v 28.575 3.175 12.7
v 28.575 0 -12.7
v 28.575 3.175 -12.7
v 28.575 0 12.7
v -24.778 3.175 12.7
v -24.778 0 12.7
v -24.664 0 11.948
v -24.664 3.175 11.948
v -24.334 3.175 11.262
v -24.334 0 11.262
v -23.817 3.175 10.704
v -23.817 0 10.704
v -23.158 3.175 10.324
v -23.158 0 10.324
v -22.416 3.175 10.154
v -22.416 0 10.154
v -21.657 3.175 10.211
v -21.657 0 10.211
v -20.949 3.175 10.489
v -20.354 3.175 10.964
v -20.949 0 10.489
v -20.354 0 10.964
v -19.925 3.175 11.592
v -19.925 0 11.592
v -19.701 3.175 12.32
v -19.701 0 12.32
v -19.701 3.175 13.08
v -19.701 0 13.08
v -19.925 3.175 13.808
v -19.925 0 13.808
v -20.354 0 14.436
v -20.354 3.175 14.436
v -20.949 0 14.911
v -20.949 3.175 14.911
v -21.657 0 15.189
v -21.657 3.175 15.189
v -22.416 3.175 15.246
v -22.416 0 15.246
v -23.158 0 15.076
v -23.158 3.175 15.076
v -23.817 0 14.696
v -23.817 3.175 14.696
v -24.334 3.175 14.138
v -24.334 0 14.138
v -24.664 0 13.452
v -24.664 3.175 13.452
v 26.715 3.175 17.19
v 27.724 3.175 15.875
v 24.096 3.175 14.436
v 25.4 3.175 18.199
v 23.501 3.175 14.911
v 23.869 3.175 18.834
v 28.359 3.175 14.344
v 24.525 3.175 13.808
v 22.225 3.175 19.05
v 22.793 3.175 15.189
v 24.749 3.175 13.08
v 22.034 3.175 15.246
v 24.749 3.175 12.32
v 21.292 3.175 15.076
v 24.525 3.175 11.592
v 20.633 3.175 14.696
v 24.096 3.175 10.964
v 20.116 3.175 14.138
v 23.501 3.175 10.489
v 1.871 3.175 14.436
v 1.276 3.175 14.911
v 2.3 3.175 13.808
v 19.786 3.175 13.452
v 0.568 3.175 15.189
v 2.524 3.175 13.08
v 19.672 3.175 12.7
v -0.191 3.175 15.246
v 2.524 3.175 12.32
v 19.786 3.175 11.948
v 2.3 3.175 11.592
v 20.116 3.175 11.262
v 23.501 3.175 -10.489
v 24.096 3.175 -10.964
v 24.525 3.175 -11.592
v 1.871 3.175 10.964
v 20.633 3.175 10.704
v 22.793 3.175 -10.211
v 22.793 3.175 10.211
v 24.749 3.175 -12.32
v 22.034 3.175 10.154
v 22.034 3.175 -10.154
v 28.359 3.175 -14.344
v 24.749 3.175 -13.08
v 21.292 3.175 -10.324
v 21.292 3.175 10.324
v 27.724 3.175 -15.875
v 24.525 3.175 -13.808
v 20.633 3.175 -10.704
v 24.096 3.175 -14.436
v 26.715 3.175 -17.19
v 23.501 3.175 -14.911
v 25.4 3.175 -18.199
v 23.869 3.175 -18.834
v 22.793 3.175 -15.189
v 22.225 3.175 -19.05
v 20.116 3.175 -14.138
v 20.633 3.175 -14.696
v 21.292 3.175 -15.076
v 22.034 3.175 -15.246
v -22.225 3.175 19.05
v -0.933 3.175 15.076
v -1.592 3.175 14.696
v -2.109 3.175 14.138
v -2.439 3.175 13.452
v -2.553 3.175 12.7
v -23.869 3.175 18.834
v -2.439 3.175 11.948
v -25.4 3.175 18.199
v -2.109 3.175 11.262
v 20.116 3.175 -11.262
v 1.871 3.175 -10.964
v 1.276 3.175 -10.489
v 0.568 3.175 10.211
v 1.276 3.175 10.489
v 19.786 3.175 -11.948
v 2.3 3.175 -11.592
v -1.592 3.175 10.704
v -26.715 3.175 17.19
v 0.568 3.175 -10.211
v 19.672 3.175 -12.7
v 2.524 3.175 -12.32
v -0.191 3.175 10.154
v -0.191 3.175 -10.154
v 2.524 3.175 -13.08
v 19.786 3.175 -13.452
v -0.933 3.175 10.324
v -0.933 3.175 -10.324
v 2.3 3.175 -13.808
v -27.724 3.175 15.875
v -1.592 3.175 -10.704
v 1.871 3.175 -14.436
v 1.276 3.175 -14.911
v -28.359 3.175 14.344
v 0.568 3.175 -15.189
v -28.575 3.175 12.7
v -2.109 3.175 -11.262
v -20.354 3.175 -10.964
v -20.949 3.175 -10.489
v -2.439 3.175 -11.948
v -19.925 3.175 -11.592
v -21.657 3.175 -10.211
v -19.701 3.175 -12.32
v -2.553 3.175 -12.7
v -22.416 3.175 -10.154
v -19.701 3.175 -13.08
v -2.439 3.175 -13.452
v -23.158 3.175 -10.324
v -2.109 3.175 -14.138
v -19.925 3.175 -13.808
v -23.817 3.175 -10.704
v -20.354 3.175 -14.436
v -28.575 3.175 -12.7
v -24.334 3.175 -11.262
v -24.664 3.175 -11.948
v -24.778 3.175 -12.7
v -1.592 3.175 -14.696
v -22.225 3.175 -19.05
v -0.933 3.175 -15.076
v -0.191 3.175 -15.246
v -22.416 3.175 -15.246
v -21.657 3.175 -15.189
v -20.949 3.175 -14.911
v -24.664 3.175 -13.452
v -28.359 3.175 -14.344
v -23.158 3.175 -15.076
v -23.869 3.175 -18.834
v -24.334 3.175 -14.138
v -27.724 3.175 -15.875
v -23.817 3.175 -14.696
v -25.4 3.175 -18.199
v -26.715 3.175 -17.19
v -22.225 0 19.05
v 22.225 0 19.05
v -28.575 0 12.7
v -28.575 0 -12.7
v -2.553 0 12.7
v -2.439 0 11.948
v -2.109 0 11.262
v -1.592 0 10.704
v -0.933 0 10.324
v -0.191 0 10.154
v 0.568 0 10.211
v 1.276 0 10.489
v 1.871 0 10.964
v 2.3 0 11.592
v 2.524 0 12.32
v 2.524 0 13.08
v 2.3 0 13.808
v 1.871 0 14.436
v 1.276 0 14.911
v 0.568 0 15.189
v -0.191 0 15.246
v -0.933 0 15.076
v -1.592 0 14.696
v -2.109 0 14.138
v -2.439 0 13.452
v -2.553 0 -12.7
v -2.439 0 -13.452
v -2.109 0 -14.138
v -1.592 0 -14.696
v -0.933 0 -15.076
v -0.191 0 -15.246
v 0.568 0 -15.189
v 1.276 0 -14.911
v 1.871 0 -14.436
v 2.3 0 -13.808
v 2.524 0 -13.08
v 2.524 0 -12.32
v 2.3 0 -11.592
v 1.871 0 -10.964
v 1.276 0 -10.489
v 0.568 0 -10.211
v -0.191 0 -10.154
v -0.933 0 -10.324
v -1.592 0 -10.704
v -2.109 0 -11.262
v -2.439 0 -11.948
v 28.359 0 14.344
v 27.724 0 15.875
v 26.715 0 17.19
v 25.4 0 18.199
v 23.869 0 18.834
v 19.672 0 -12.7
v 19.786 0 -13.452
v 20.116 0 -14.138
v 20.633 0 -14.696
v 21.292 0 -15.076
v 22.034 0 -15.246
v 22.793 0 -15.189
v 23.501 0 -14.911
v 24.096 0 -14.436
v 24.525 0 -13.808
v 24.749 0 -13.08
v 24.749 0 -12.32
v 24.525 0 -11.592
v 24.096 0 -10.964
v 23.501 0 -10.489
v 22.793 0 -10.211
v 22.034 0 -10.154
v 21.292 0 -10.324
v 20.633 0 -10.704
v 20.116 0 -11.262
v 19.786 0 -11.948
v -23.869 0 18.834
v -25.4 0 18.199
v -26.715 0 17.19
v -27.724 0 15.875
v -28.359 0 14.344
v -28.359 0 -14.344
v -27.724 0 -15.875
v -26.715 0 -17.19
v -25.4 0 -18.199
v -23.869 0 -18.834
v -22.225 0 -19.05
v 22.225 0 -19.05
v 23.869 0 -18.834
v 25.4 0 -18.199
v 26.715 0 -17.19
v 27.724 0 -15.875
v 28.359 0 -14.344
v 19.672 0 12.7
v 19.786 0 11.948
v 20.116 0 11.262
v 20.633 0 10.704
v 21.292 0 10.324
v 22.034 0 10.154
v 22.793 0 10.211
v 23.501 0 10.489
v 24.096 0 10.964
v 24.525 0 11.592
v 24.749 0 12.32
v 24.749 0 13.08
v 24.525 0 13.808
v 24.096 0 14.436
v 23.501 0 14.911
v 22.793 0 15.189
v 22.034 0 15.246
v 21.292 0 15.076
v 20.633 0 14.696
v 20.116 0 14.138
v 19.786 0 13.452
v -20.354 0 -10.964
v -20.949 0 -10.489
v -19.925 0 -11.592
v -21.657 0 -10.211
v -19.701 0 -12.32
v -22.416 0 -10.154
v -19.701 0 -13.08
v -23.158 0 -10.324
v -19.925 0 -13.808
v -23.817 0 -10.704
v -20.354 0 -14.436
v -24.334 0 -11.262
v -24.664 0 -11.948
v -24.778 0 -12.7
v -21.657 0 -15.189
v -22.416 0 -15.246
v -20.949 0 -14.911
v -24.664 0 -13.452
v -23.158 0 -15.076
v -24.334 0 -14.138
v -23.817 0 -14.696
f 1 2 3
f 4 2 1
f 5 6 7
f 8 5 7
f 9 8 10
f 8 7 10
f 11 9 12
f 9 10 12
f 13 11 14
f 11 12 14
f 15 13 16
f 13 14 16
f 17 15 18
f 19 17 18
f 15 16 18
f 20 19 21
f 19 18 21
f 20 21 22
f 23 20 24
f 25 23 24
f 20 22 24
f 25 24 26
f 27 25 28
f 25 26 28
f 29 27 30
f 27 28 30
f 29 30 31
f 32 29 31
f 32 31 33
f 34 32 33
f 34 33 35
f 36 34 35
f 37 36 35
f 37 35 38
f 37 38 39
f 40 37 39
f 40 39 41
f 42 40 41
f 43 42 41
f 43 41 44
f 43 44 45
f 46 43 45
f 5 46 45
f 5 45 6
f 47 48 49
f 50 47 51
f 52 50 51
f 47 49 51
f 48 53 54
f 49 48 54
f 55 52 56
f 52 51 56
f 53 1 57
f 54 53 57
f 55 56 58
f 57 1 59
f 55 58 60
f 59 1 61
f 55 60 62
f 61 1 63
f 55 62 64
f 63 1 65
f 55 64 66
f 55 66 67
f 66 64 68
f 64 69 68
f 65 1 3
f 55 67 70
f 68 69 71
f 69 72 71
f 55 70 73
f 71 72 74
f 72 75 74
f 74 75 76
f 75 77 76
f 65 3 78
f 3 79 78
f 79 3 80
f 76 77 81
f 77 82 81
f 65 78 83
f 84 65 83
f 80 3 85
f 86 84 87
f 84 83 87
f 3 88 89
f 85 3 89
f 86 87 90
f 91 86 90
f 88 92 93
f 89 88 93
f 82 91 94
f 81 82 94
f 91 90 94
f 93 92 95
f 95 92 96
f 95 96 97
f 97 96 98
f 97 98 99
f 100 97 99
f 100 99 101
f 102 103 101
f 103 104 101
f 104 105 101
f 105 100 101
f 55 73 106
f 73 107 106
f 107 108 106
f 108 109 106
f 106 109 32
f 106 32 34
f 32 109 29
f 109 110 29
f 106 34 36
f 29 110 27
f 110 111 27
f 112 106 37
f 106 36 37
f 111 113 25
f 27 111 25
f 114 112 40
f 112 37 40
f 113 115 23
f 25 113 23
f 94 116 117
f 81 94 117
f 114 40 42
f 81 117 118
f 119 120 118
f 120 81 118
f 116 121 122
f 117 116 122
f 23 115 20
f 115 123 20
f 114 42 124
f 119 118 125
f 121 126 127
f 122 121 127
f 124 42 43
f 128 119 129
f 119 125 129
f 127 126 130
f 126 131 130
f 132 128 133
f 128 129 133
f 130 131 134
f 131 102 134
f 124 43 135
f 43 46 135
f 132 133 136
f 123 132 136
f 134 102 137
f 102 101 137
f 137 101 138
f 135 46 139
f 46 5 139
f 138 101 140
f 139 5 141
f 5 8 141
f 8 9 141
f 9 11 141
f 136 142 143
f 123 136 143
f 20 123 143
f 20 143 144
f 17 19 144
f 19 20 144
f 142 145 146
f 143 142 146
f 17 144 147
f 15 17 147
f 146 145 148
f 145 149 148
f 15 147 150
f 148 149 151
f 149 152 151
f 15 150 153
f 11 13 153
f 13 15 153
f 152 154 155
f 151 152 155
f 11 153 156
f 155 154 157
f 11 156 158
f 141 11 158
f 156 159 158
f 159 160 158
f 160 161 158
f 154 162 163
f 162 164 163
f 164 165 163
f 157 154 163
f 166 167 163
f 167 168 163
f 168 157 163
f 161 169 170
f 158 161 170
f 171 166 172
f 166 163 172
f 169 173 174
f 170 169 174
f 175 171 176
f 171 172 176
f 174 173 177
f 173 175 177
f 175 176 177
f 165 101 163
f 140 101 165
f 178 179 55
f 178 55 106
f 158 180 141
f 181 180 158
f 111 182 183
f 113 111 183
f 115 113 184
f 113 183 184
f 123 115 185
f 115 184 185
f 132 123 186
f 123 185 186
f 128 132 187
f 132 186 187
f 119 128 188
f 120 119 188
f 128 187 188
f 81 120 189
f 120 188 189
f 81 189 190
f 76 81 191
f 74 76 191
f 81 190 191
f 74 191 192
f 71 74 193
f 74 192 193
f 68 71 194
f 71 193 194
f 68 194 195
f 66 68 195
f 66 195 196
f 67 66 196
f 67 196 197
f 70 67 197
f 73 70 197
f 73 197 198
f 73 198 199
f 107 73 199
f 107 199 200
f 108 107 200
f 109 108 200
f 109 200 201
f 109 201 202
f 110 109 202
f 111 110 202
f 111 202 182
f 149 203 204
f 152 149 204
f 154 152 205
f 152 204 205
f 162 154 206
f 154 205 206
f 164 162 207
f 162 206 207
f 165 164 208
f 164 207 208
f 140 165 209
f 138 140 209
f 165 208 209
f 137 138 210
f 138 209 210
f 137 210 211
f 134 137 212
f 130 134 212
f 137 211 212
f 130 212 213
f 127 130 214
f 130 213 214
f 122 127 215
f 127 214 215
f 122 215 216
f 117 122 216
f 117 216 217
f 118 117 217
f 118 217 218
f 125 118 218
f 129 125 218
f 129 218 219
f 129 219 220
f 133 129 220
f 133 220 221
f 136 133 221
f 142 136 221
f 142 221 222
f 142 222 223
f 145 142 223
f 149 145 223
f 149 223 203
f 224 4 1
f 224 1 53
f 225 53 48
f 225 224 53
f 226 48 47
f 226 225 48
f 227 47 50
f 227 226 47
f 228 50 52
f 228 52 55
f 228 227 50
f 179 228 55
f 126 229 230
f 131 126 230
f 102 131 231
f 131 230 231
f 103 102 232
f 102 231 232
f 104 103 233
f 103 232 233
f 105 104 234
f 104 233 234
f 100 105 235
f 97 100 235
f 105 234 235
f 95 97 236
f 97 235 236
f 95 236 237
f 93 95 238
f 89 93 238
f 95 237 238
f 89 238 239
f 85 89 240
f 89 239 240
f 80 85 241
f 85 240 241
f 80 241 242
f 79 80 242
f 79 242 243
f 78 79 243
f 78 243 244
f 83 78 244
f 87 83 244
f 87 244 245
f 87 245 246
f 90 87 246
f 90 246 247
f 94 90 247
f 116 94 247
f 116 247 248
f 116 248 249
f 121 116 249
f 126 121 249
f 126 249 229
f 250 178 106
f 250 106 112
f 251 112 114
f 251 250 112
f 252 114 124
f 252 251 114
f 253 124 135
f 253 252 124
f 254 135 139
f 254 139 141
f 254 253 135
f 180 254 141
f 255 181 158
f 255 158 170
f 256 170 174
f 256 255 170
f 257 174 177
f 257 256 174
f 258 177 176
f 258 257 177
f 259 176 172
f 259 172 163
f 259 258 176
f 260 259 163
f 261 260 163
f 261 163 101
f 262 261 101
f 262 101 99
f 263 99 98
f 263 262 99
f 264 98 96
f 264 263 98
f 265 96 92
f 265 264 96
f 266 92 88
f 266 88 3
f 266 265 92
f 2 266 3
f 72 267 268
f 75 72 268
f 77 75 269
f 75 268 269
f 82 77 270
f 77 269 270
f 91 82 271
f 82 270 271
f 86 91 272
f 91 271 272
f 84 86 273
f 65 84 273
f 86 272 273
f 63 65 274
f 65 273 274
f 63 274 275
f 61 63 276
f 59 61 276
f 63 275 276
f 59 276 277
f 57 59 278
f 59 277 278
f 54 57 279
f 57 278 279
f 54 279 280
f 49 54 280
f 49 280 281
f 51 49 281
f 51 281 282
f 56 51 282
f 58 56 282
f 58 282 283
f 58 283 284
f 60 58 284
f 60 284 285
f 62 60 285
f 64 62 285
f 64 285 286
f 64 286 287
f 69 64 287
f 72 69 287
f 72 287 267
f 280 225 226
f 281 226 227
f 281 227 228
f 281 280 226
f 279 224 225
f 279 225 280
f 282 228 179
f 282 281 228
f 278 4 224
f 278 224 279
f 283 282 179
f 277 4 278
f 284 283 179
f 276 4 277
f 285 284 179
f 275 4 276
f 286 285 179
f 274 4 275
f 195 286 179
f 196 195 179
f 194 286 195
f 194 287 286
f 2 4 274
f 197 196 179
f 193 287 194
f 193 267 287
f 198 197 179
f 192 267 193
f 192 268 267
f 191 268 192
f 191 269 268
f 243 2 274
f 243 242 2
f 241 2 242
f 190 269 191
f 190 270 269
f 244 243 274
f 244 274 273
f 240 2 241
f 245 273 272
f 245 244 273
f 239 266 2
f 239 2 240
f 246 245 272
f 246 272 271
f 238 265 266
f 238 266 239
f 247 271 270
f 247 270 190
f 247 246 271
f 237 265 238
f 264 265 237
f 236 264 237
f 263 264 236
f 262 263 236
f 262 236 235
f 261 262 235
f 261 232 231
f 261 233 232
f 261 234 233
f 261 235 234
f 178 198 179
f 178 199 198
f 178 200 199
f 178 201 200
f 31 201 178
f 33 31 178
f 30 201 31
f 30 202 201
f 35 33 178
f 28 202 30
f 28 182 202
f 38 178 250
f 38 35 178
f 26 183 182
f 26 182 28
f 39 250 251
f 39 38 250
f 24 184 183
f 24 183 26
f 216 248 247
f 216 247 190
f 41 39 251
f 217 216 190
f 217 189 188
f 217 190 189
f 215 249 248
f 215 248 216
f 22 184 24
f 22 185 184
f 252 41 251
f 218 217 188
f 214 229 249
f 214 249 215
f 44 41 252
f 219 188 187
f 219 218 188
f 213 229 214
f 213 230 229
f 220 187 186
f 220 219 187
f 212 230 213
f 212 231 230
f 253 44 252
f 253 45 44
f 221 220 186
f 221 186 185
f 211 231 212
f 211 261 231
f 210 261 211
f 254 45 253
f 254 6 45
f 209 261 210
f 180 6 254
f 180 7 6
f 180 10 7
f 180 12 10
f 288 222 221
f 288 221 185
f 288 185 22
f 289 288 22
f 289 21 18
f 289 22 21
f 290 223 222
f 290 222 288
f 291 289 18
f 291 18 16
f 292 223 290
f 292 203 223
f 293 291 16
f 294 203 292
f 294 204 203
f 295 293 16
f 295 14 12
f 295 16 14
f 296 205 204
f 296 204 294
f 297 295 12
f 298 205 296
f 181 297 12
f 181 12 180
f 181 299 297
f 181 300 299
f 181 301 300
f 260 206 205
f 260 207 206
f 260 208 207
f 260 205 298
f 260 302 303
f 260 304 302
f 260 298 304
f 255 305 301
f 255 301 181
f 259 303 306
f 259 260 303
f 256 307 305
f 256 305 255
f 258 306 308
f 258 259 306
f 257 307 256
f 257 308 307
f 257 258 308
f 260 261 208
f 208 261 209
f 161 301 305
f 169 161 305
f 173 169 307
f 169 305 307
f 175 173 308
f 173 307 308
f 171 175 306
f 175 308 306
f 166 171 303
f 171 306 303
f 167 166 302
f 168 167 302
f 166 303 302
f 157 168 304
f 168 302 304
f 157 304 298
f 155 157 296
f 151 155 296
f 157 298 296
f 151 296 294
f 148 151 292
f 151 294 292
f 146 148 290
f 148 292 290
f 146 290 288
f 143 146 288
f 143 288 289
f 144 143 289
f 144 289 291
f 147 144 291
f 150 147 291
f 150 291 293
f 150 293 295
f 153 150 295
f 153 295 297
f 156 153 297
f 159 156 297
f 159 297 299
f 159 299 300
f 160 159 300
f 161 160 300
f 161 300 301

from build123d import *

# Parameters (mm, degrees)
BOSS_EXTRUDE1_DEPTH    = 3.175
F_10_CLEARANCE_HOLE1_D = 5.1054


with BuildPart() as part:
    # Sketch1 → Boss-Extrude1 (new body)
    with BuildSketch(Plane(origin=(0, 0, 0), x_dir=(1, 0, 0), z_dir=(0, 1, 0))):
        with BuildLine():
            Line((22.225, -19.05), (-22.225, -19.05))
            ThreePointArc((-22.225, -19.05), (-26.715128061, -17.190128061), (-28.575, -12.7))
            Line((-28.575, -12.7), (-28.575, 12.7))
            ThreePointArc((-28.575, 12.7), (-26.715128061, 17.190128061), (-22.225, 19.05))
            Line((-22.225, 19.05), (22.225, 19.05))
            ThreePointArc((22.225, 19.05), (26.715128061, 17.190128061), (28.575, 12.7))
            Line((28.575, 12.7), (28.575, -12.7))
            ThreePointArc((28.575, -12.7), (26.715128061, -17.190128061), (22.225, -19.05))
        make_face()
    extrude(amount=BOSS_EXTRUDE1_DEPTH)

    # #10 Clearance Hole1 (through all)
    with Locations(Plane(origin=(0, 3.175, 0), x_dir=(1, 0, 0), z_dir=(0, 1, 0))):
        with Locations((-22.225, 12.7), (0, 12.7), (22.225, 12.7), (0, -12.7), (22.225, -12.7), (-22.225, -12.7)):
            Hole(F_10_CLEARANCE_HOLE1_D / 2)


solid = part.part
